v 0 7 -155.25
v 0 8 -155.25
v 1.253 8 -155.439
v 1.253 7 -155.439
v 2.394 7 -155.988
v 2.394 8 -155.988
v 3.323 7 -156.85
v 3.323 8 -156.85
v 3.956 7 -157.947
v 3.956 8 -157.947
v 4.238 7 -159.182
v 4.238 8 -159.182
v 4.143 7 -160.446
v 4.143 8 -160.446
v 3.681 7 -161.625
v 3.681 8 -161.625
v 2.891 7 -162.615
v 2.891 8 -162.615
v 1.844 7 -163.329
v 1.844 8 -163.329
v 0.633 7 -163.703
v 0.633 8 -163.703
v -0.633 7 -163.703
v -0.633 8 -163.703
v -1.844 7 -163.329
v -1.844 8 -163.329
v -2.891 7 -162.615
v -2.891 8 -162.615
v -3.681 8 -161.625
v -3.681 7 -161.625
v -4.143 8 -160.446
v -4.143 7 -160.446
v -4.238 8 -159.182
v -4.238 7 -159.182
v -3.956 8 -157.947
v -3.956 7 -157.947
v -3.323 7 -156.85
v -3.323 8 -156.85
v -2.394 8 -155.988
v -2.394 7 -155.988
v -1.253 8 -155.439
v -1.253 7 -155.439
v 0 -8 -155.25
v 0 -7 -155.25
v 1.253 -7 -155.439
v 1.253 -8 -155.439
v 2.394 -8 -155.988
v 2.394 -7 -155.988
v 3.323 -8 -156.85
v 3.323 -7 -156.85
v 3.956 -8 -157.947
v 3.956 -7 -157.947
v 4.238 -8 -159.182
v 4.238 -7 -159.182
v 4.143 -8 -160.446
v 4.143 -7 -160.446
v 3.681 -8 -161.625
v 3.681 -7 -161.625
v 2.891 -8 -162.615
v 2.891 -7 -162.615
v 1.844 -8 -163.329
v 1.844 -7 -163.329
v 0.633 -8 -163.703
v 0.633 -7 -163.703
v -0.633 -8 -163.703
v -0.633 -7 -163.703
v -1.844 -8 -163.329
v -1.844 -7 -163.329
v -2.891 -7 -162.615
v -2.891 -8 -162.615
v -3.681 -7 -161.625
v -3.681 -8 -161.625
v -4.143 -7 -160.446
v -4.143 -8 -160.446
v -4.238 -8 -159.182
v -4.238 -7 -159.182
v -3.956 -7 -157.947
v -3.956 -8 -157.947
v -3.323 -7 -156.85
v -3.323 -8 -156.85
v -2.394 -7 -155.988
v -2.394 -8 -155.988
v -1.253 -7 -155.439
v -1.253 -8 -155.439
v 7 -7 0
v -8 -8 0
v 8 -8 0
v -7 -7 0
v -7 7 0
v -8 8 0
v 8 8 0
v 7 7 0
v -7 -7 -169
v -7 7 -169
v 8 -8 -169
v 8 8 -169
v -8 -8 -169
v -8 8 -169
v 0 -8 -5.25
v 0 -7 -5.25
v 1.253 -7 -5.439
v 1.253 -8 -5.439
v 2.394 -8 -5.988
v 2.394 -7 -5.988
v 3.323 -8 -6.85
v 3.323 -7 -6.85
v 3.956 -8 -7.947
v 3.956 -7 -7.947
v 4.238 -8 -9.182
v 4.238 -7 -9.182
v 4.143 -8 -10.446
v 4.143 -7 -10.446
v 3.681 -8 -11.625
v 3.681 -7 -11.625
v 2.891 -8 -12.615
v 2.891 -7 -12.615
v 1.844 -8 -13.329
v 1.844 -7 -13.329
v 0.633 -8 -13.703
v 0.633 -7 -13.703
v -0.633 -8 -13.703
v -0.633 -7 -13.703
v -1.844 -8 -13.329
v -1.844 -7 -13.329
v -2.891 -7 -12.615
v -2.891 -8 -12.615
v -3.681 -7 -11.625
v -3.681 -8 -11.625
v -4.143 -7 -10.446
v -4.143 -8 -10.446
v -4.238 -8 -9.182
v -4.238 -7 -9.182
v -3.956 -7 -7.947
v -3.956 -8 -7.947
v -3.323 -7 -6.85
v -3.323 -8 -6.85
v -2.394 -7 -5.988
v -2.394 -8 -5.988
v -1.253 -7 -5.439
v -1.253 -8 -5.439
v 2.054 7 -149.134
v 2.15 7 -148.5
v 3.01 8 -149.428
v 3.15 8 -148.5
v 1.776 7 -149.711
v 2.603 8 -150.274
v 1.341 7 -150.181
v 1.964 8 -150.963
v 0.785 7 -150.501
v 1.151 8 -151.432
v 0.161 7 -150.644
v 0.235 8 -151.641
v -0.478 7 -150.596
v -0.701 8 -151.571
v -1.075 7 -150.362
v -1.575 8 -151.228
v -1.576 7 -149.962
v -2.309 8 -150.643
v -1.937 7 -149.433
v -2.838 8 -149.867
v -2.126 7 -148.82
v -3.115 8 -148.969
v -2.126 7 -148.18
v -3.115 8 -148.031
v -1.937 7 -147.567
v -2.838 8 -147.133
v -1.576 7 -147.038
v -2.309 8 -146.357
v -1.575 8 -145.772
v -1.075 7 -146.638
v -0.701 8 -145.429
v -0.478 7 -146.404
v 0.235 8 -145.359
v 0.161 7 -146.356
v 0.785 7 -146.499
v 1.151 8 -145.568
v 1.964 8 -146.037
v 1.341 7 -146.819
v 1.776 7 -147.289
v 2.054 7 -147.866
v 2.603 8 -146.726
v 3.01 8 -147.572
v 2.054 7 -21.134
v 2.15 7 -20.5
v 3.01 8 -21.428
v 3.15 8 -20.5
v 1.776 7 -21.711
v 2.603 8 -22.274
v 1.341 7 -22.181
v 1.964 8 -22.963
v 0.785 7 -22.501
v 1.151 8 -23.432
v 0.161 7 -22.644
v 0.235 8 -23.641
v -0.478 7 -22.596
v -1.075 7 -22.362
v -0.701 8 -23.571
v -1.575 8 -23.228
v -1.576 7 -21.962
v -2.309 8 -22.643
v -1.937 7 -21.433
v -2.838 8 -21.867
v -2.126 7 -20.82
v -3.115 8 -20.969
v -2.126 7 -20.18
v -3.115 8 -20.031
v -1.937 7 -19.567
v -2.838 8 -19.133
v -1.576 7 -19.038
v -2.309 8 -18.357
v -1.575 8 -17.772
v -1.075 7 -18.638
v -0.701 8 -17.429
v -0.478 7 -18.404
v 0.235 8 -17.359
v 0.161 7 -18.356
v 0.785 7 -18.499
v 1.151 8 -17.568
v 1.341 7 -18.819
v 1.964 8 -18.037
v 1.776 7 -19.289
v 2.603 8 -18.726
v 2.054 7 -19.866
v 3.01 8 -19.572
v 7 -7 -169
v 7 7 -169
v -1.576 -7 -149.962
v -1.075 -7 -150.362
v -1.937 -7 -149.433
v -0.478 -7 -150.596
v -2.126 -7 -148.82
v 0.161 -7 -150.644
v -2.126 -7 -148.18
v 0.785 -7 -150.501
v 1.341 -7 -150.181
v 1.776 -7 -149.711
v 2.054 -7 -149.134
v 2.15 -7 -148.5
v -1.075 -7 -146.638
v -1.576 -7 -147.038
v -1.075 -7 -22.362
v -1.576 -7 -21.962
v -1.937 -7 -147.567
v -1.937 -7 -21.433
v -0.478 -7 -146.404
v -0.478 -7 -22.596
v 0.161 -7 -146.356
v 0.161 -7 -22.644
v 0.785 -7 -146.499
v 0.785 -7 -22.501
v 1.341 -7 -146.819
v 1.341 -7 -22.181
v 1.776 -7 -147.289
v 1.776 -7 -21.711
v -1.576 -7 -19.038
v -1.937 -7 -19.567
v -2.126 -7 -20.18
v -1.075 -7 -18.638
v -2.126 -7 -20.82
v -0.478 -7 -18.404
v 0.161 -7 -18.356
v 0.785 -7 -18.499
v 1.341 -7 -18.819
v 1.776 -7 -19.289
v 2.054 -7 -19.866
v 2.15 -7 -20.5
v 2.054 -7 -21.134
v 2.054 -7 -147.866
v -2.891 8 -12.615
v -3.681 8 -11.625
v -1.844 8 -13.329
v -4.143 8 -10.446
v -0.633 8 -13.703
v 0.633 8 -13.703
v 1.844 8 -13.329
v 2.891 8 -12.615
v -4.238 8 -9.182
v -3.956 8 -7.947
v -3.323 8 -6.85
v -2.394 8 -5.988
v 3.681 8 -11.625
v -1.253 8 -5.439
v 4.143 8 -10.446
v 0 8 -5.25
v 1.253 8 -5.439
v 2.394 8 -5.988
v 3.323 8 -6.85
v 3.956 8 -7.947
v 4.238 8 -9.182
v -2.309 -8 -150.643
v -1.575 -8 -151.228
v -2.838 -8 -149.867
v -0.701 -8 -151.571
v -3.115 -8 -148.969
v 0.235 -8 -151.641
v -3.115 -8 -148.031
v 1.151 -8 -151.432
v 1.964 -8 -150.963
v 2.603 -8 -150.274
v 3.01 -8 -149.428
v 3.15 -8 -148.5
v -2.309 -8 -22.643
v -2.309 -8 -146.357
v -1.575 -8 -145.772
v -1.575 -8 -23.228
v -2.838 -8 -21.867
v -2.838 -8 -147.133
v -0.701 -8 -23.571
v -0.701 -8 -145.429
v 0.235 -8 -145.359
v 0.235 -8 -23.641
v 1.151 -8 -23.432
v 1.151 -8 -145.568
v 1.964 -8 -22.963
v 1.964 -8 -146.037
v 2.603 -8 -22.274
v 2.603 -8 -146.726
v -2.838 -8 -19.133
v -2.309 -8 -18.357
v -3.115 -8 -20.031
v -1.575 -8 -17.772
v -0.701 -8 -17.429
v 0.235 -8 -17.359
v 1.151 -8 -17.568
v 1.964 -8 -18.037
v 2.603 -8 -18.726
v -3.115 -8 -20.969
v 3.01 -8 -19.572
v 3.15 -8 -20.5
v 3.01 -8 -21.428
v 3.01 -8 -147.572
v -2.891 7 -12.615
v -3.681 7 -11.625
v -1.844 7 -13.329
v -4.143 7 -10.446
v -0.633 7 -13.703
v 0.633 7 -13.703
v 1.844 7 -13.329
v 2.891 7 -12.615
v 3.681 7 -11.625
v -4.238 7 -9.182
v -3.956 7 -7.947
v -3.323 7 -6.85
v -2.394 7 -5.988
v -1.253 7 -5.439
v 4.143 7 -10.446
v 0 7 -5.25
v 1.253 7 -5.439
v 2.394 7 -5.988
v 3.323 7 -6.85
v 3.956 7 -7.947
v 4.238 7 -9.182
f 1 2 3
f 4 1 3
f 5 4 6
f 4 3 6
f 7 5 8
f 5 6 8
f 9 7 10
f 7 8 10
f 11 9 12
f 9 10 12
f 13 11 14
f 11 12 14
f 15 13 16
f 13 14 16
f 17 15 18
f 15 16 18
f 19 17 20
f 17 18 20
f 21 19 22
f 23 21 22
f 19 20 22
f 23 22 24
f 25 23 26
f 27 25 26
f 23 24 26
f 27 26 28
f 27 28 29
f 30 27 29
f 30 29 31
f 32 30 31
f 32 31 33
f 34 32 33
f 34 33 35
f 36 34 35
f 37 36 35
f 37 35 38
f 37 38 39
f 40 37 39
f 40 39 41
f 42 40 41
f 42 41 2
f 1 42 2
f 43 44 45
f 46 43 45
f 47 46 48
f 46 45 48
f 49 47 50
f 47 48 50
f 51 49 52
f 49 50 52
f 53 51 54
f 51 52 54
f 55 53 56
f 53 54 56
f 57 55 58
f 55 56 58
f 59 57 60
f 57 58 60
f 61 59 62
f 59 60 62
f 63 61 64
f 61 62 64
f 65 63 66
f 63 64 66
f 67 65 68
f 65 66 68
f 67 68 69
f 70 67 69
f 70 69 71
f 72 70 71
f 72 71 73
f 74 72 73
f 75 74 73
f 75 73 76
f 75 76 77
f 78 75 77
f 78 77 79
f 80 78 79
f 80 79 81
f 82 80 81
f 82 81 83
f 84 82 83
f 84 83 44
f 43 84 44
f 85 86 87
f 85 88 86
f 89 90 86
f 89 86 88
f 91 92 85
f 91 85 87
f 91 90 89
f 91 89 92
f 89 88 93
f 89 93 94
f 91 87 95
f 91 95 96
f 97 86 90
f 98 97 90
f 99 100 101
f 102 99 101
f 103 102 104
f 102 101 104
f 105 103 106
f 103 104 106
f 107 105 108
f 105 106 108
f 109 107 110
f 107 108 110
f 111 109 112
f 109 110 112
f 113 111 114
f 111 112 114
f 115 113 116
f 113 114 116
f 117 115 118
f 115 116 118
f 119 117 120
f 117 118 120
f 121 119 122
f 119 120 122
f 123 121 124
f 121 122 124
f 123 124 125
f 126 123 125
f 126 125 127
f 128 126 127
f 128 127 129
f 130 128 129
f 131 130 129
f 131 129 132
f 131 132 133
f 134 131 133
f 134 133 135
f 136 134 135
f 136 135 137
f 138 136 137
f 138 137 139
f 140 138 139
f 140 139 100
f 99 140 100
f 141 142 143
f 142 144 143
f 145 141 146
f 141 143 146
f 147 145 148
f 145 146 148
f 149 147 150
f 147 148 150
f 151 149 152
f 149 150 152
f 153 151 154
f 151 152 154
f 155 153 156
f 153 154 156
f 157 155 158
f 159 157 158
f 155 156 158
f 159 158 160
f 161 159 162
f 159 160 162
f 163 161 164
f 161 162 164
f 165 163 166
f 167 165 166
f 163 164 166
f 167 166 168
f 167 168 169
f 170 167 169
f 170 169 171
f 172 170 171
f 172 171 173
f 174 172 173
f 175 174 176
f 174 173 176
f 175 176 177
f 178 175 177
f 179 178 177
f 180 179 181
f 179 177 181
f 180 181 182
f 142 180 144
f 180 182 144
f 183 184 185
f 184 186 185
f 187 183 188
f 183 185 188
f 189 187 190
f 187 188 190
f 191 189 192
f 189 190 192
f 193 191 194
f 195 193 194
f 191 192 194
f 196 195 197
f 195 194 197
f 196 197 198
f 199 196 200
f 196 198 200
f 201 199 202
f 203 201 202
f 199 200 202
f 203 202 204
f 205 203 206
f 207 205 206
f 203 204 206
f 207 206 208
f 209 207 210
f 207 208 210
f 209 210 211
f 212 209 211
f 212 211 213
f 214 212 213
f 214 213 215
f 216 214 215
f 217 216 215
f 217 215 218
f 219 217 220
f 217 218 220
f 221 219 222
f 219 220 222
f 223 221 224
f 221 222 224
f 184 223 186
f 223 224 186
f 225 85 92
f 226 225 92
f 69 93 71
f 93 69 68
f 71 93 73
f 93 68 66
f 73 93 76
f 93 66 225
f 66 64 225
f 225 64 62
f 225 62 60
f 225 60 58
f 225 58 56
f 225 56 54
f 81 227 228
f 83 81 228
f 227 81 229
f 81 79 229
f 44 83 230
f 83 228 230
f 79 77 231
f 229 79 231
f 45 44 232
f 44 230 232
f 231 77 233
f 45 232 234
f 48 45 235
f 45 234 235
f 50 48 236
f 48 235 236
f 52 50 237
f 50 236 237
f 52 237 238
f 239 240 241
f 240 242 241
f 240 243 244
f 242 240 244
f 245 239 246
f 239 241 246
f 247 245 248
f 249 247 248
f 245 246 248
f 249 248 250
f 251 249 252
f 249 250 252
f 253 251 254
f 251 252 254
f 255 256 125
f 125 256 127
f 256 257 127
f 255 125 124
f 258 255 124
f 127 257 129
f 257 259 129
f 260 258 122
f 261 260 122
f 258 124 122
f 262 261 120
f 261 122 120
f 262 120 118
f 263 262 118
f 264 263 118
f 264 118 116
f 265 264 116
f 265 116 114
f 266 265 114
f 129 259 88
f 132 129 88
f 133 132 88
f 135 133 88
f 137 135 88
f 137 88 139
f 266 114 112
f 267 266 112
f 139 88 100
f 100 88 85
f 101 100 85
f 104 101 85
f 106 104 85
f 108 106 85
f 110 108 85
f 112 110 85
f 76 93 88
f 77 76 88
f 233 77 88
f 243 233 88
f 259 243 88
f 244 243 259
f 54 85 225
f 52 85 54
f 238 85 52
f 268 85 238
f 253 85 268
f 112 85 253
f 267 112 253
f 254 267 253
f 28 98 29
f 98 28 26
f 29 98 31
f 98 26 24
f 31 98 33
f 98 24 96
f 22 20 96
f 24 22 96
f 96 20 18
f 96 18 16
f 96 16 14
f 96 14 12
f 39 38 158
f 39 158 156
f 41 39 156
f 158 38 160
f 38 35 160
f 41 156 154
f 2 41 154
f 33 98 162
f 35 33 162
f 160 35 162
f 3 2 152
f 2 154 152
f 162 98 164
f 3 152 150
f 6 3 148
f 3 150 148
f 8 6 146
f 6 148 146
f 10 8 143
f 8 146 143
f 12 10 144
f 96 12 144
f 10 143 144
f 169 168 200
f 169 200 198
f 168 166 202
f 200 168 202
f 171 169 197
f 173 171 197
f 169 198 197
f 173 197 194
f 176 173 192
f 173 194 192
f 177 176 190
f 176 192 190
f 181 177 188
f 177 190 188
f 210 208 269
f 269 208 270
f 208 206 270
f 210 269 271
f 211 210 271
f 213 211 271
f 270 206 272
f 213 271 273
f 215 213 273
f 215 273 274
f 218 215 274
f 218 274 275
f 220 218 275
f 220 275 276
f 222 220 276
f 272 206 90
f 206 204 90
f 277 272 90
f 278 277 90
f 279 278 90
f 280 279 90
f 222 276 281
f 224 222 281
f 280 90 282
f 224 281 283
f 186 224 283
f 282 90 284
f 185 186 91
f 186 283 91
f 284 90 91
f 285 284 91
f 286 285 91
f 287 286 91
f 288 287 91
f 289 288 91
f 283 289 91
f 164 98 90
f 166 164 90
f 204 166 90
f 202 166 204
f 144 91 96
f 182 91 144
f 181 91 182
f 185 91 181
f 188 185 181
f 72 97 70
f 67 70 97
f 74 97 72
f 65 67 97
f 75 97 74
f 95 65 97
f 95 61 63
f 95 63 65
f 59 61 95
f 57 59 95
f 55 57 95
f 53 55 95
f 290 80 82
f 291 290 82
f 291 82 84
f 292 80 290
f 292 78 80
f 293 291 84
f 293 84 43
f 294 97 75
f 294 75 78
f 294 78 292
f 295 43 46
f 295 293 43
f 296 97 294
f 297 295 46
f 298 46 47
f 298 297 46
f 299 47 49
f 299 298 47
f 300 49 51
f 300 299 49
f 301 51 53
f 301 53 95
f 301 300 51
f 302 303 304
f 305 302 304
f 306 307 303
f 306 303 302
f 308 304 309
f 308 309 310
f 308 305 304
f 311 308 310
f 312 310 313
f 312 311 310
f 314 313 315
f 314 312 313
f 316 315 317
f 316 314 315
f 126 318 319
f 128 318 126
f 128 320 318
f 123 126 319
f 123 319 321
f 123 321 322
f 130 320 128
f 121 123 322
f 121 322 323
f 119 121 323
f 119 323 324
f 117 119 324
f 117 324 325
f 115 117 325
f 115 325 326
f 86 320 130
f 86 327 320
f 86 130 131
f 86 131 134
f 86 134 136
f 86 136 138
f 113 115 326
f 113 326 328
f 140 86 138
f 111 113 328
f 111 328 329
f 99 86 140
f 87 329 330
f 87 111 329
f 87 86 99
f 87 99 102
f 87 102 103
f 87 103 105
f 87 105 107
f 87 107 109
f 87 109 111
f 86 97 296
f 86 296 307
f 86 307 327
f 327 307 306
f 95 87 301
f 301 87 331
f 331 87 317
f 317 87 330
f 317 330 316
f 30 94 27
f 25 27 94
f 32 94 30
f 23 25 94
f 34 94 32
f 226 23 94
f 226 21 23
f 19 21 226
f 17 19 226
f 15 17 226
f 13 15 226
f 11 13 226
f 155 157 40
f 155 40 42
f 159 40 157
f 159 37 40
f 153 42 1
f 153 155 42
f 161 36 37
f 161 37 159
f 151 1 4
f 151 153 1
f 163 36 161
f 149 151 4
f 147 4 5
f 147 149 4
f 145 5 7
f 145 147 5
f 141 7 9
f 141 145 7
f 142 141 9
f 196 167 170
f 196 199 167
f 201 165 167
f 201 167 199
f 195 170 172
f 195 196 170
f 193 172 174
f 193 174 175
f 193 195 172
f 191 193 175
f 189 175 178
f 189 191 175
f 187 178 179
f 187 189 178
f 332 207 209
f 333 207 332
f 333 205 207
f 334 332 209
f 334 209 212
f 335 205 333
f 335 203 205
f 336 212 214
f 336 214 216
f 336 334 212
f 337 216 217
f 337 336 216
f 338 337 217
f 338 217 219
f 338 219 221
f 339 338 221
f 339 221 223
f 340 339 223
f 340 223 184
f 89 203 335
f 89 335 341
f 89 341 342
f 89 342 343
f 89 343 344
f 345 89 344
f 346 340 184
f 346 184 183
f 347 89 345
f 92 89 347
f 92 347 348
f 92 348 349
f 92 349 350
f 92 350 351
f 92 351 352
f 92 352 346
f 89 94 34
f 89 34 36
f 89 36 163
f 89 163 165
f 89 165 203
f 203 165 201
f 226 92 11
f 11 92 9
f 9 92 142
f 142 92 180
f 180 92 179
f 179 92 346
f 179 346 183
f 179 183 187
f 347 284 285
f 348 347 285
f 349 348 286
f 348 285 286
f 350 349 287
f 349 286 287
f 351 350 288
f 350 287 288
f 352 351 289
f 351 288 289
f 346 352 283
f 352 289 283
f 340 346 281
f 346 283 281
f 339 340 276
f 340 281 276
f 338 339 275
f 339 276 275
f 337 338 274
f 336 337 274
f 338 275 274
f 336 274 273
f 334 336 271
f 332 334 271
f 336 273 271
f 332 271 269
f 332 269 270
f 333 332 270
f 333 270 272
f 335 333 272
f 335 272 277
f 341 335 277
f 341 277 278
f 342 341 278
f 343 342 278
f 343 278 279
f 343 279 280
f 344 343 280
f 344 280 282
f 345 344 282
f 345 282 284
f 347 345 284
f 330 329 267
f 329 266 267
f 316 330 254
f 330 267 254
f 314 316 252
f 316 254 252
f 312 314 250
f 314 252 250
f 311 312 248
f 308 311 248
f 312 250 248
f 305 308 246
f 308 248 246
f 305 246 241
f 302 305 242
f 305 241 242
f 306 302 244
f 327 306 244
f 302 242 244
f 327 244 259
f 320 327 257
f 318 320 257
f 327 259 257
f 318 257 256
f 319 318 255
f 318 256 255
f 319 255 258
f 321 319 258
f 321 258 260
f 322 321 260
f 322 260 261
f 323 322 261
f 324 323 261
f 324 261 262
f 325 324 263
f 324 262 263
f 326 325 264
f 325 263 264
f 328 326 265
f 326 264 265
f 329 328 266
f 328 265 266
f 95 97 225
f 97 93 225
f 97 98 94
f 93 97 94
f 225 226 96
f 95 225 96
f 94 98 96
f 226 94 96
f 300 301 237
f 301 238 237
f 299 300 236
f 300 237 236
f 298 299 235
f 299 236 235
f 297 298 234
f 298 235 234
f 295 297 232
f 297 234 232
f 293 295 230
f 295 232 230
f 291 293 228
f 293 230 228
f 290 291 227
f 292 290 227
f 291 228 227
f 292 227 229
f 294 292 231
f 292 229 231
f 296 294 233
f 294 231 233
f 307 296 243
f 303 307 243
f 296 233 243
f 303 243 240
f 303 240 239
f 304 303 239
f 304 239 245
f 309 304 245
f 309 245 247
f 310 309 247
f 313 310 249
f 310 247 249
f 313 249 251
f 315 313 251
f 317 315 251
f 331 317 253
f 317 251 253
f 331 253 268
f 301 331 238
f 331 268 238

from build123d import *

# Parameters (mm, degrees)
SKETCH1_W           = 16
SKETCH1_H           = 16
SKETCH1_W_2         = 14
SKETCH1_H_2         = 14
BOSS_EXTRUDE1_DEPTH = 169
SKETCH2_R           = 4.25
SKETCH2_R_2         = 1.5
CUT_EXTRUDE1_DEPTH  = 170.944108459


# Read off the part's stored shape, not the designer's step: CSK for M3 Flat Head Machine Screw1
with BuildPart() as part:
    # Sketch1 → Boss-Extrude1 (new body)
    with BuildSketch(Plane.XY):
        Rectangle(SKETCH1_W, SKETCH1_H)
        Rectangle(SKETCH1_W_2, SKETCH1_H_2, mode=Mode.SUBTRACT)
    extrude(amount=-BOSS_EXTRUDE1_DEPTH)

    # Sketch2 → Cut-Extrude1 (cut, through all)
    with BuildSketch(Plane(origin=(0, 8, 0), x_dir=(1, 0, 0), z_dir=(0, 1, 0))):
        with Locations(Location((0, 159.5, 0), (0, 0, 270))):
            Circle(SKETCH2_R)
        with Locations(Location((0, 9.5, 0), (0, 0, 270))):
            Circle(SKETCH2_R)
        with Locations(Location((0, 20.5, 0), (0, 0, 270))):
            Circle(SKETCH2_R_2)
        with Locations(Location((0, 148.5, 0), (0, 0, 270))):
            Circle(SKETCH2_R_2)
    extrude(amount=-CUT_EXTRUDE1_DEPTH, mode=Mode.SUBTRACT)

    # CSK for M3 Flat Head Machine Screw1 outl → CSK for M3 Flat Head Machine Screw1 (revolve, cut)
    with BuildSketch(Plane.XY.offset(-148.5)):
        Polygon((1.5, -8), (3.15, -8), (2.15, -7), (1.5, -7), align=None)
        Polygon((3.15, 8), (1.5, 8), (1.5, 7), (2.15, 7), align=None)
    revolve(axis=Axis((0, 0, -148.5), (0, 1, 0)), mode=Mode.SUBTRACT)

    # CSK for M3 Flat Head Machine Screw1 2 ou → CSK for M3 Flat Head Machine Screw1 2 (revolve, cut)
    with BuildSketch(Plane.XY.offset(-20.5)):
        Polygon((1.5, -8), (3.15, -8), (2.15, -7), (1.5, -7), align=None)
        Polygon((3.15, 8), (1.5, 8), (1.5, 7), (2.15, 7), align=None)
    revolve(axis=Axis((0, 0, -20.5), (0, 1, 0)), mode=Mode.SUBTRACT)


solid = part.part
